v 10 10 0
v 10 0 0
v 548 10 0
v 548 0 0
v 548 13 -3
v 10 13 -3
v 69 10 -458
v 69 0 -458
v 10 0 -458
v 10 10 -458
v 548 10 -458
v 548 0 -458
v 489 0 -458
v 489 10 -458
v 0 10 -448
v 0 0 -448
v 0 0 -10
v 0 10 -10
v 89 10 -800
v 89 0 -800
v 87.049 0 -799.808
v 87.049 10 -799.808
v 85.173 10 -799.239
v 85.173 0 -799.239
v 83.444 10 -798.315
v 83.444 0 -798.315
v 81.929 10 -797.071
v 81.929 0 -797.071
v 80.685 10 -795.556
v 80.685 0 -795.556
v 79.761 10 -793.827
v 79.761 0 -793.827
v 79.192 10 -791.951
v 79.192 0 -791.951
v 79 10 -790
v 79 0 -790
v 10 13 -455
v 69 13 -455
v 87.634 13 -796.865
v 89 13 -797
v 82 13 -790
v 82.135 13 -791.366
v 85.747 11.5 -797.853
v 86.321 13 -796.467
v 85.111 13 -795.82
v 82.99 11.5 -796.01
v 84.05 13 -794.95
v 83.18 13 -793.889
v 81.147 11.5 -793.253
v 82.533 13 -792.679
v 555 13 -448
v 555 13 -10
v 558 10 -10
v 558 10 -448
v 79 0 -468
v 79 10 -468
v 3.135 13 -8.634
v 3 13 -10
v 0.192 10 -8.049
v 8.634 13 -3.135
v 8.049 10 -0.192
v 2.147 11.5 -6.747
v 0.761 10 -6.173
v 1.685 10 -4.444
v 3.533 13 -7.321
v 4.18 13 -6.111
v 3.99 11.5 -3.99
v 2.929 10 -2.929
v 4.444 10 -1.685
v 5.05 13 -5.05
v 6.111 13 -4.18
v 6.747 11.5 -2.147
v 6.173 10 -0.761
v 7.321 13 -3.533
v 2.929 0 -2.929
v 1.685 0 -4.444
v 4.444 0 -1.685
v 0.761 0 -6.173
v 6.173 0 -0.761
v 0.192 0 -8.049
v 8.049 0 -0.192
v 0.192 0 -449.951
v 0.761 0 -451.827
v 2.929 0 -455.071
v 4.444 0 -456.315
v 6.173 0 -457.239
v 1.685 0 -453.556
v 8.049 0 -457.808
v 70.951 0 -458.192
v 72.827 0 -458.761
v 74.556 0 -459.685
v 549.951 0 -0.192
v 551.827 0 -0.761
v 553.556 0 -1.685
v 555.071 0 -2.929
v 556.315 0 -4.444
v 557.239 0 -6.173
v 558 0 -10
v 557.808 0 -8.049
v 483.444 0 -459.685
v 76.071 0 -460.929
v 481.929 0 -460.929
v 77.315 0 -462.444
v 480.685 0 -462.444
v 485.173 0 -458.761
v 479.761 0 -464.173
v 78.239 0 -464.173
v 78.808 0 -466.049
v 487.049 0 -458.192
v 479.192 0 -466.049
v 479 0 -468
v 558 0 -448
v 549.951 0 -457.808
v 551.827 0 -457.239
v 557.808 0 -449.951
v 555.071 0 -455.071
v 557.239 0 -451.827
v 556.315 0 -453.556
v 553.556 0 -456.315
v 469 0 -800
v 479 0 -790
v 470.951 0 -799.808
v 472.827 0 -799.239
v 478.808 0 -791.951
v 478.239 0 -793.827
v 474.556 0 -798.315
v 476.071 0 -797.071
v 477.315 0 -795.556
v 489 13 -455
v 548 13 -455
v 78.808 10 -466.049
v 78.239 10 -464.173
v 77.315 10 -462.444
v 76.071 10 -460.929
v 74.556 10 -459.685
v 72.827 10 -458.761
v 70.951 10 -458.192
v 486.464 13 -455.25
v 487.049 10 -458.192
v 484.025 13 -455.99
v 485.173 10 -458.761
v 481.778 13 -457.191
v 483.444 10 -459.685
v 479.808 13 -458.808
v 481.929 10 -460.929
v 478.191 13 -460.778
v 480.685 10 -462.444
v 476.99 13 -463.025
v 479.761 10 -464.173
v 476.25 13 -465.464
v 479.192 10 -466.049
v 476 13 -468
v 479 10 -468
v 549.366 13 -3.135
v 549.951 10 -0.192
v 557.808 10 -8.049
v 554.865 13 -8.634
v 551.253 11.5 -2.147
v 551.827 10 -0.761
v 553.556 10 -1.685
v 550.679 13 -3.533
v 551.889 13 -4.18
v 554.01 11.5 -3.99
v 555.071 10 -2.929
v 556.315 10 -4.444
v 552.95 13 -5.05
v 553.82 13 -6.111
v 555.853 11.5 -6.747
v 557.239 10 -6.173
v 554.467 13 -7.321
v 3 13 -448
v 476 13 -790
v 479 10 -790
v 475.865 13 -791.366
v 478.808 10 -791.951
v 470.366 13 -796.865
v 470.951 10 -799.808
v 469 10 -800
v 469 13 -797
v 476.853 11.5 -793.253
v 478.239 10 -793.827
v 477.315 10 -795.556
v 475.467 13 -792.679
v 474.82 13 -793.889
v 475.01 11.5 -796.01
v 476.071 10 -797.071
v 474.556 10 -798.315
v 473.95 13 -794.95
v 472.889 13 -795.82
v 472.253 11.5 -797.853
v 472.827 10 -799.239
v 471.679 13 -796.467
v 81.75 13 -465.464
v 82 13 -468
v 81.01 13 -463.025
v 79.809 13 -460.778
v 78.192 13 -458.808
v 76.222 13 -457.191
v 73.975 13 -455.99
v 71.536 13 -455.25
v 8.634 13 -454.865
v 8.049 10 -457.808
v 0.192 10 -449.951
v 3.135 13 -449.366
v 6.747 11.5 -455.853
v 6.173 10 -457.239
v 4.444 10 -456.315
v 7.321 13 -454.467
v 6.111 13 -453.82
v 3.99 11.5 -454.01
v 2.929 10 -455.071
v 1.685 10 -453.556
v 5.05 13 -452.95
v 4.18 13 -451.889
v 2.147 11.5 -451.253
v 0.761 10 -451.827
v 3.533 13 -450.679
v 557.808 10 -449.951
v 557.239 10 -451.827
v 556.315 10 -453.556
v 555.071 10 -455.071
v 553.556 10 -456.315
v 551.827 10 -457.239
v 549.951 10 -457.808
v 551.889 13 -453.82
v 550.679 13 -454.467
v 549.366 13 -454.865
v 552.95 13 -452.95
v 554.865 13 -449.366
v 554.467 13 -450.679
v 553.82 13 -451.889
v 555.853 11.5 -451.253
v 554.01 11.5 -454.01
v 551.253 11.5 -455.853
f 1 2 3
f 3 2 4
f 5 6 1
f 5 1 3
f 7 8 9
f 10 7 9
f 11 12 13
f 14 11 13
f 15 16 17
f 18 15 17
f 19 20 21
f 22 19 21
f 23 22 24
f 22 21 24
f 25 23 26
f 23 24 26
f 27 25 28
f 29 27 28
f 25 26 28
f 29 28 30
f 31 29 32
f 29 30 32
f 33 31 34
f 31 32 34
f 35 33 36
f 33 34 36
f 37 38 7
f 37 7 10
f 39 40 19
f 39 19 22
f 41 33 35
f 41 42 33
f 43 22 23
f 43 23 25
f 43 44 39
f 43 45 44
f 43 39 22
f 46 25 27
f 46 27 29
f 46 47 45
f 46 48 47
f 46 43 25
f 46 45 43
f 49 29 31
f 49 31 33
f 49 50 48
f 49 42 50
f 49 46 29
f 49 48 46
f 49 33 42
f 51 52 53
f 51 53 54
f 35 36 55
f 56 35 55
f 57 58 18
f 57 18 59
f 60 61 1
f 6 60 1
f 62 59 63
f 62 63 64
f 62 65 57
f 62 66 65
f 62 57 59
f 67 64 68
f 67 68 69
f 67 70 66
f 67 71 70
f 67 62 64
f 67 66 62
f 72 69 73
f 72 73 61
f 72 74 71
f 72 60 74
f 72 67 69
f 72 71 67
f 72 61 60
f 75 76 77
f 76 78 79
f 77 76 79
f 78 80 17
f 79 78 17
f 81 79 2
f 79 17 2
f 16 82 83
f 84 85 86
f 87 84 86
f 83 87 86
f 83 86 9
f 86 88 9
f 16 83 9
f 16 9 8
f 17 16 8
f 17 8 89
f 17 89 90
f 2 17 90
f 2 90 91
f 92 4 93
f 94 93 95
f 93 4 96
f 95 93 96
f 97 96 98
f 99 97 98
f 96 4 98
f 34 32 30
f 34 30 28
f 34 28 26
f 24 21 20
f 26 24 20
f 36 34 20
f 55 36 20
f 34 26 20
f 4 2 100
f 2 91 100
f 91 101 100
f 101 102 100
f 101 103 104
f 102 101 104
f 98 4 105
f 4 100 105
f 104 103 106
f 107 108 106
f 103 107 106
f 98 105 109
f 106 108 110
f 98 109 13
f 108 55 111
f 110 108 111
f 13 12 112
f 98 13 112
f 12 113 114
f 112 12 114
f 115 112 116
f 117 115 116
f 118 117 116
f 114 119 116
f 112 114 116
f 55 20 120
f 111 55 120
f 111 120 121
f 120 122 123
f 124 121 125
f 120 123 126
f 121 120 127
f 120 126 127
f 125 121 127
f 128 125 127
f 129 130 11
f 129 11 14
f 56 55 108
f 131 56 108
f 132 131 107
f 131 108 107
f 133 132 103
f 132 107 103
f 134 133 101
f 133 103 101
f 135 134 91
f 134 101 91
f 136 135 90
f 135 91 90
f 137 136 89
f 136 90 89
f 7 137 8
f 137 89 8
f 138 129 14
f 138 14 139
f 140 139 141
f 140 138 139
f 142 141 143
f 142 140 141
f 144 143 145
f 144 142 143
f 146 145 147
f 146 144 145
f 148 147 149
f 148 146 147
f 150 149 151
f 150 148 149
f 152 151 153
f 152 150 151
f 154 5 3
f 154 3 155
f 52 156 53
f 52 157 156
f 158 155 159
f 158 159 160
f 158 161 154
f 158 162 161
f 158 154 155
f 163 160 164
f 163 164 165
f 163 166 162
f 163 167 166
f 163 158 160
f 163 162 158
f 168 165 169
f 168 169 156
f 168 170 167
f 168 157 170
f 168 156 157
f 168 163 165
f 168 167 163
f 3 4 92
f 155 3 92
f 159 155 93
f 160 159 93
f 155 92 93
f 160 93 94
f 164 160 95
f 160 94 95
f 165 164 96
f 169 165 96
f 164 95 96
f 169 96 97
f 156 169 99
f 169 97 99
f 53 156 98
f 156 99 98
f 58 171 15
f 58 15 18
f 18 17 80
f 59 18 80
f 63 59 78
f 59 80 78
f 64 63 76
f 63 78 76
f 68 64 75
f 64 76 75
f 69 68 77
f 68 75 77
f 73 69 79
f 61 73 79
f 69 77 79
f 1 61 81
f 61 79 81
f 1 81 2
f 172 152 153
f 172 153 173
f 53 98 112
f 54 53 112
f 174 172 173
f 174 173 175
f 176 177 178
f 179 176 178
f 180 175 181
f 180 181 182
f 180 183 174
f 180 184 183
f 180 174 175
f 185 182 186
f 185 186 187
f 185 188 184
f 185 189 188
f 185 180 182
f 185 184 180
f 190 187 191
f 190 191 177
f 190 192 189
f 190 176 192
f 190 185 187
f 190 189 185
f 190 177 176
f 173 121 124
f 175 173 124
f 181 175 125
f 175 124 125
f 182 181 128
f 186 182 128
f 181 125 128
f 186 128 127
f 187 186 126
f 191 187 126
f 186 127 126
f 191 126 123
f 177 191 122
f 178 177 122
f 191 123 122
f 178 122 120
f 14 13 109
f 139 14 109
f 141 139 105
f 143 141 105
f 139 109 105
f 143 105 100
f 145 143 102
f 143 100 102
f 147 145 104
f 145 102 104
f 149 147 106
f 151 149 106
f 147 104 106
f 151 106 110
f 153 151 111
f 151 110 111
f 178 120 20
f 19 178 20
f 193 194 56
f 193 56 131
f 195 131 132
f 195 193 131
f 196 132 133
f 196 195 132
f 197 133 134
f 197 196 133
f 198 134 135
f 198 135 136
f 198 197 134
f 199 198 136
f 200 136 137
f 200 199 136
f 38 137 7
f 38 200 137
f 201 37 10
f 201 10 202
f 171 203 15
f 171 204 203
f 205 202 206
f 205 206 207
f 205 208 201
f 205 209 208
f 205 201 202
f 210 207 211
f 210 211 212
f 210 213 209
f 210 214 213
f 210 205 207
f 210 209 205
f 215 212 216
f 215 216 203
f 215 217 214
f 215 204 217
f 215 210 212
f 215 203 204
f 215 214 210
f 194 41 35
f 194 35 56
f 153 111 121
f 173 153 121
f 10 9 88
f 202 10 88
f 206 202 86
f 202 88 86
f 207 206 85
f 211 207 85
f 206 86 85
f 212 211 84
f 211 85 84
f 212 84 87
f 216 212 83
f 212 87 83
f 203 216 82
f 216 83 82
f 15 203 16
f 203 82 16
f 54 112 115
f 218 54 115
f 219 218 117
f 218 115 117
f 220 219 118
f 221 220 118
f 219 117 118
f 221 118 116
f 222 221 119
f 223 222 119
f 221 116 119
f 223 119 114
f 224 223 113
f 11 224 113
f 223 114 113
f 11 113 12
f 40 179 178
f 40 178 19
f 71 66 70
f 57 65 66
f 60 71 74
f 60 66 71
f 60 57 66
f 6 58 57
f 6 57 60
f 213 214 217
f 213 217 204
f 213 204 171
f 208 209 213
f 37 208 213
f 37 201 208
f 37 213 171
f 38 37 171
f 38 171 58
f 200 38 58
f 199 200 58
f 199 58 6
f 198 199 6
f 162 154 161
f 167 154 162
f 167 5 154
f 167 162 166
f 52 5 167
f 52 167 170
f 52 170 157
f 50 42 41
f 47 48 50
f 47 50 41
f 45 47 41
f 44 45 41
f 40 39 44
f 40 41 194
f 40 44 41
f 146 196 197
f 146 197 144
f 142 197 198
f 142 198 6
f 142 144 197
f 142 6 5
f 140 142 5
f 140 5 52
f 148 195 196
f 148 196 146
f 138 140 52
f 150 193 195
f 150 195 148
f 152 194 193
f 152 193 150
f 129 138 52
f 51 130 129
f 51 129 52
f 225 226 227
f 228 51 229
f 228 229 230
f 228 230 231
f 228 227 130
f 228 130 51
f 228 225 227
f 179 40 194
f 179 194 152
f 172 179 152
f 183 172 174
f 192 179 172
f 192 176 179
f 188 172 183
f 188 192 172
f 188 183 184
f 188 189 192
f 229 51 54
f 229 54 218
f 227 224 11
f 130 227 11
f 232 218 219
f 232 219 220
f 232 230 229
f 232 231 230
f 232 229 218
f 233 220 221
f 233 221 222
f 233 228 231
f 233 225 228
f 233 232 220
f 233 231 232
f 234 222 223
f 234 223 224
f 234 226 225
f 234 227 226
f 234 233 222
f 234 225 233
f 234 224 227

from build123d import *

# Parameters (mm, degrees)
BOSS_EXTRUDE2_DEPTH = 13
CHAMFER2_SIZE       = 3


with BuildPart() as part:
    # Sketch1 → Boss-Extrude2 (new body)
    with BuildSketch(Plane(origin=(0, 0, 0), x_dir=(1, 0, 0), z_dir=(0, 1, 0))):
        with BuildLine():
            Line((10, 0), (548, 0))
            ThreePointArc((548, 0), (555.071067812, 2.928932188), (558, 10))
            Line((558, 10), (558, 448))
            ThreePointArc((558, 448), (555.071067812, 455.071067812), (548, 458))
            Line((548, 458), (489, 458))
            ThreePointArc((489, 458), (481.928932188, 460.928932188), (479, 468))
            Line((479, 468), (479, 790))
            ThreePointArc((479, 790), (476.071067812, 797.071067812), (469, 800))
            Line((469, 800), (89, 800))
            ThreePointArc((89, 800), (81.928932188, 797.071067812), (79, 790))
            Line((79, 790), (79, 468))
            ThreePointArc((79, 468), (76.071067812, 460.928932188), (69, 458))
            Line((69, 458), (10, 458))
            ThreePointArc((10, 458), (2.928932188, 455.071067812), (0, 448))
            Line((0, 448), (0, 10))
            ThreePointArc((0, 10), (2.928932188, 2.928932188), (10, 0))
        make_face()
    extrude(amount=BOSS_EXTRUDE2_DEPTH)

    # Chamfer2
    chamfer2_edges = [part.edges().sort_by_distance(p)[0] for p in [
        (81.928932188, 13, -797.071067812),
        (79, 13, -629),
        (76.071067812, 13, -460.928932188),
        (39.5, 13, -458),
        (2.928932188, 13, -455.071067812),
        (0, 13, -229),
        (2.928932188, 13, -2.928932188),
        (279, 13, 0),
        (555.071067812, 13, -2.928932188),
        (558, 13, -229),
        (476.071067812, 13, -797.071067812),
        (555.071067812, 13, -455.071067812),
        (518.5, 13, -458),
        (481.928932188, 13, -460.928932188),
        (479, 13, -629),
        (279, 13, -800),
    ]]
    chamfer(chamfer2_edges, length=CHAMFER2_SIZE)


solid = part.part
